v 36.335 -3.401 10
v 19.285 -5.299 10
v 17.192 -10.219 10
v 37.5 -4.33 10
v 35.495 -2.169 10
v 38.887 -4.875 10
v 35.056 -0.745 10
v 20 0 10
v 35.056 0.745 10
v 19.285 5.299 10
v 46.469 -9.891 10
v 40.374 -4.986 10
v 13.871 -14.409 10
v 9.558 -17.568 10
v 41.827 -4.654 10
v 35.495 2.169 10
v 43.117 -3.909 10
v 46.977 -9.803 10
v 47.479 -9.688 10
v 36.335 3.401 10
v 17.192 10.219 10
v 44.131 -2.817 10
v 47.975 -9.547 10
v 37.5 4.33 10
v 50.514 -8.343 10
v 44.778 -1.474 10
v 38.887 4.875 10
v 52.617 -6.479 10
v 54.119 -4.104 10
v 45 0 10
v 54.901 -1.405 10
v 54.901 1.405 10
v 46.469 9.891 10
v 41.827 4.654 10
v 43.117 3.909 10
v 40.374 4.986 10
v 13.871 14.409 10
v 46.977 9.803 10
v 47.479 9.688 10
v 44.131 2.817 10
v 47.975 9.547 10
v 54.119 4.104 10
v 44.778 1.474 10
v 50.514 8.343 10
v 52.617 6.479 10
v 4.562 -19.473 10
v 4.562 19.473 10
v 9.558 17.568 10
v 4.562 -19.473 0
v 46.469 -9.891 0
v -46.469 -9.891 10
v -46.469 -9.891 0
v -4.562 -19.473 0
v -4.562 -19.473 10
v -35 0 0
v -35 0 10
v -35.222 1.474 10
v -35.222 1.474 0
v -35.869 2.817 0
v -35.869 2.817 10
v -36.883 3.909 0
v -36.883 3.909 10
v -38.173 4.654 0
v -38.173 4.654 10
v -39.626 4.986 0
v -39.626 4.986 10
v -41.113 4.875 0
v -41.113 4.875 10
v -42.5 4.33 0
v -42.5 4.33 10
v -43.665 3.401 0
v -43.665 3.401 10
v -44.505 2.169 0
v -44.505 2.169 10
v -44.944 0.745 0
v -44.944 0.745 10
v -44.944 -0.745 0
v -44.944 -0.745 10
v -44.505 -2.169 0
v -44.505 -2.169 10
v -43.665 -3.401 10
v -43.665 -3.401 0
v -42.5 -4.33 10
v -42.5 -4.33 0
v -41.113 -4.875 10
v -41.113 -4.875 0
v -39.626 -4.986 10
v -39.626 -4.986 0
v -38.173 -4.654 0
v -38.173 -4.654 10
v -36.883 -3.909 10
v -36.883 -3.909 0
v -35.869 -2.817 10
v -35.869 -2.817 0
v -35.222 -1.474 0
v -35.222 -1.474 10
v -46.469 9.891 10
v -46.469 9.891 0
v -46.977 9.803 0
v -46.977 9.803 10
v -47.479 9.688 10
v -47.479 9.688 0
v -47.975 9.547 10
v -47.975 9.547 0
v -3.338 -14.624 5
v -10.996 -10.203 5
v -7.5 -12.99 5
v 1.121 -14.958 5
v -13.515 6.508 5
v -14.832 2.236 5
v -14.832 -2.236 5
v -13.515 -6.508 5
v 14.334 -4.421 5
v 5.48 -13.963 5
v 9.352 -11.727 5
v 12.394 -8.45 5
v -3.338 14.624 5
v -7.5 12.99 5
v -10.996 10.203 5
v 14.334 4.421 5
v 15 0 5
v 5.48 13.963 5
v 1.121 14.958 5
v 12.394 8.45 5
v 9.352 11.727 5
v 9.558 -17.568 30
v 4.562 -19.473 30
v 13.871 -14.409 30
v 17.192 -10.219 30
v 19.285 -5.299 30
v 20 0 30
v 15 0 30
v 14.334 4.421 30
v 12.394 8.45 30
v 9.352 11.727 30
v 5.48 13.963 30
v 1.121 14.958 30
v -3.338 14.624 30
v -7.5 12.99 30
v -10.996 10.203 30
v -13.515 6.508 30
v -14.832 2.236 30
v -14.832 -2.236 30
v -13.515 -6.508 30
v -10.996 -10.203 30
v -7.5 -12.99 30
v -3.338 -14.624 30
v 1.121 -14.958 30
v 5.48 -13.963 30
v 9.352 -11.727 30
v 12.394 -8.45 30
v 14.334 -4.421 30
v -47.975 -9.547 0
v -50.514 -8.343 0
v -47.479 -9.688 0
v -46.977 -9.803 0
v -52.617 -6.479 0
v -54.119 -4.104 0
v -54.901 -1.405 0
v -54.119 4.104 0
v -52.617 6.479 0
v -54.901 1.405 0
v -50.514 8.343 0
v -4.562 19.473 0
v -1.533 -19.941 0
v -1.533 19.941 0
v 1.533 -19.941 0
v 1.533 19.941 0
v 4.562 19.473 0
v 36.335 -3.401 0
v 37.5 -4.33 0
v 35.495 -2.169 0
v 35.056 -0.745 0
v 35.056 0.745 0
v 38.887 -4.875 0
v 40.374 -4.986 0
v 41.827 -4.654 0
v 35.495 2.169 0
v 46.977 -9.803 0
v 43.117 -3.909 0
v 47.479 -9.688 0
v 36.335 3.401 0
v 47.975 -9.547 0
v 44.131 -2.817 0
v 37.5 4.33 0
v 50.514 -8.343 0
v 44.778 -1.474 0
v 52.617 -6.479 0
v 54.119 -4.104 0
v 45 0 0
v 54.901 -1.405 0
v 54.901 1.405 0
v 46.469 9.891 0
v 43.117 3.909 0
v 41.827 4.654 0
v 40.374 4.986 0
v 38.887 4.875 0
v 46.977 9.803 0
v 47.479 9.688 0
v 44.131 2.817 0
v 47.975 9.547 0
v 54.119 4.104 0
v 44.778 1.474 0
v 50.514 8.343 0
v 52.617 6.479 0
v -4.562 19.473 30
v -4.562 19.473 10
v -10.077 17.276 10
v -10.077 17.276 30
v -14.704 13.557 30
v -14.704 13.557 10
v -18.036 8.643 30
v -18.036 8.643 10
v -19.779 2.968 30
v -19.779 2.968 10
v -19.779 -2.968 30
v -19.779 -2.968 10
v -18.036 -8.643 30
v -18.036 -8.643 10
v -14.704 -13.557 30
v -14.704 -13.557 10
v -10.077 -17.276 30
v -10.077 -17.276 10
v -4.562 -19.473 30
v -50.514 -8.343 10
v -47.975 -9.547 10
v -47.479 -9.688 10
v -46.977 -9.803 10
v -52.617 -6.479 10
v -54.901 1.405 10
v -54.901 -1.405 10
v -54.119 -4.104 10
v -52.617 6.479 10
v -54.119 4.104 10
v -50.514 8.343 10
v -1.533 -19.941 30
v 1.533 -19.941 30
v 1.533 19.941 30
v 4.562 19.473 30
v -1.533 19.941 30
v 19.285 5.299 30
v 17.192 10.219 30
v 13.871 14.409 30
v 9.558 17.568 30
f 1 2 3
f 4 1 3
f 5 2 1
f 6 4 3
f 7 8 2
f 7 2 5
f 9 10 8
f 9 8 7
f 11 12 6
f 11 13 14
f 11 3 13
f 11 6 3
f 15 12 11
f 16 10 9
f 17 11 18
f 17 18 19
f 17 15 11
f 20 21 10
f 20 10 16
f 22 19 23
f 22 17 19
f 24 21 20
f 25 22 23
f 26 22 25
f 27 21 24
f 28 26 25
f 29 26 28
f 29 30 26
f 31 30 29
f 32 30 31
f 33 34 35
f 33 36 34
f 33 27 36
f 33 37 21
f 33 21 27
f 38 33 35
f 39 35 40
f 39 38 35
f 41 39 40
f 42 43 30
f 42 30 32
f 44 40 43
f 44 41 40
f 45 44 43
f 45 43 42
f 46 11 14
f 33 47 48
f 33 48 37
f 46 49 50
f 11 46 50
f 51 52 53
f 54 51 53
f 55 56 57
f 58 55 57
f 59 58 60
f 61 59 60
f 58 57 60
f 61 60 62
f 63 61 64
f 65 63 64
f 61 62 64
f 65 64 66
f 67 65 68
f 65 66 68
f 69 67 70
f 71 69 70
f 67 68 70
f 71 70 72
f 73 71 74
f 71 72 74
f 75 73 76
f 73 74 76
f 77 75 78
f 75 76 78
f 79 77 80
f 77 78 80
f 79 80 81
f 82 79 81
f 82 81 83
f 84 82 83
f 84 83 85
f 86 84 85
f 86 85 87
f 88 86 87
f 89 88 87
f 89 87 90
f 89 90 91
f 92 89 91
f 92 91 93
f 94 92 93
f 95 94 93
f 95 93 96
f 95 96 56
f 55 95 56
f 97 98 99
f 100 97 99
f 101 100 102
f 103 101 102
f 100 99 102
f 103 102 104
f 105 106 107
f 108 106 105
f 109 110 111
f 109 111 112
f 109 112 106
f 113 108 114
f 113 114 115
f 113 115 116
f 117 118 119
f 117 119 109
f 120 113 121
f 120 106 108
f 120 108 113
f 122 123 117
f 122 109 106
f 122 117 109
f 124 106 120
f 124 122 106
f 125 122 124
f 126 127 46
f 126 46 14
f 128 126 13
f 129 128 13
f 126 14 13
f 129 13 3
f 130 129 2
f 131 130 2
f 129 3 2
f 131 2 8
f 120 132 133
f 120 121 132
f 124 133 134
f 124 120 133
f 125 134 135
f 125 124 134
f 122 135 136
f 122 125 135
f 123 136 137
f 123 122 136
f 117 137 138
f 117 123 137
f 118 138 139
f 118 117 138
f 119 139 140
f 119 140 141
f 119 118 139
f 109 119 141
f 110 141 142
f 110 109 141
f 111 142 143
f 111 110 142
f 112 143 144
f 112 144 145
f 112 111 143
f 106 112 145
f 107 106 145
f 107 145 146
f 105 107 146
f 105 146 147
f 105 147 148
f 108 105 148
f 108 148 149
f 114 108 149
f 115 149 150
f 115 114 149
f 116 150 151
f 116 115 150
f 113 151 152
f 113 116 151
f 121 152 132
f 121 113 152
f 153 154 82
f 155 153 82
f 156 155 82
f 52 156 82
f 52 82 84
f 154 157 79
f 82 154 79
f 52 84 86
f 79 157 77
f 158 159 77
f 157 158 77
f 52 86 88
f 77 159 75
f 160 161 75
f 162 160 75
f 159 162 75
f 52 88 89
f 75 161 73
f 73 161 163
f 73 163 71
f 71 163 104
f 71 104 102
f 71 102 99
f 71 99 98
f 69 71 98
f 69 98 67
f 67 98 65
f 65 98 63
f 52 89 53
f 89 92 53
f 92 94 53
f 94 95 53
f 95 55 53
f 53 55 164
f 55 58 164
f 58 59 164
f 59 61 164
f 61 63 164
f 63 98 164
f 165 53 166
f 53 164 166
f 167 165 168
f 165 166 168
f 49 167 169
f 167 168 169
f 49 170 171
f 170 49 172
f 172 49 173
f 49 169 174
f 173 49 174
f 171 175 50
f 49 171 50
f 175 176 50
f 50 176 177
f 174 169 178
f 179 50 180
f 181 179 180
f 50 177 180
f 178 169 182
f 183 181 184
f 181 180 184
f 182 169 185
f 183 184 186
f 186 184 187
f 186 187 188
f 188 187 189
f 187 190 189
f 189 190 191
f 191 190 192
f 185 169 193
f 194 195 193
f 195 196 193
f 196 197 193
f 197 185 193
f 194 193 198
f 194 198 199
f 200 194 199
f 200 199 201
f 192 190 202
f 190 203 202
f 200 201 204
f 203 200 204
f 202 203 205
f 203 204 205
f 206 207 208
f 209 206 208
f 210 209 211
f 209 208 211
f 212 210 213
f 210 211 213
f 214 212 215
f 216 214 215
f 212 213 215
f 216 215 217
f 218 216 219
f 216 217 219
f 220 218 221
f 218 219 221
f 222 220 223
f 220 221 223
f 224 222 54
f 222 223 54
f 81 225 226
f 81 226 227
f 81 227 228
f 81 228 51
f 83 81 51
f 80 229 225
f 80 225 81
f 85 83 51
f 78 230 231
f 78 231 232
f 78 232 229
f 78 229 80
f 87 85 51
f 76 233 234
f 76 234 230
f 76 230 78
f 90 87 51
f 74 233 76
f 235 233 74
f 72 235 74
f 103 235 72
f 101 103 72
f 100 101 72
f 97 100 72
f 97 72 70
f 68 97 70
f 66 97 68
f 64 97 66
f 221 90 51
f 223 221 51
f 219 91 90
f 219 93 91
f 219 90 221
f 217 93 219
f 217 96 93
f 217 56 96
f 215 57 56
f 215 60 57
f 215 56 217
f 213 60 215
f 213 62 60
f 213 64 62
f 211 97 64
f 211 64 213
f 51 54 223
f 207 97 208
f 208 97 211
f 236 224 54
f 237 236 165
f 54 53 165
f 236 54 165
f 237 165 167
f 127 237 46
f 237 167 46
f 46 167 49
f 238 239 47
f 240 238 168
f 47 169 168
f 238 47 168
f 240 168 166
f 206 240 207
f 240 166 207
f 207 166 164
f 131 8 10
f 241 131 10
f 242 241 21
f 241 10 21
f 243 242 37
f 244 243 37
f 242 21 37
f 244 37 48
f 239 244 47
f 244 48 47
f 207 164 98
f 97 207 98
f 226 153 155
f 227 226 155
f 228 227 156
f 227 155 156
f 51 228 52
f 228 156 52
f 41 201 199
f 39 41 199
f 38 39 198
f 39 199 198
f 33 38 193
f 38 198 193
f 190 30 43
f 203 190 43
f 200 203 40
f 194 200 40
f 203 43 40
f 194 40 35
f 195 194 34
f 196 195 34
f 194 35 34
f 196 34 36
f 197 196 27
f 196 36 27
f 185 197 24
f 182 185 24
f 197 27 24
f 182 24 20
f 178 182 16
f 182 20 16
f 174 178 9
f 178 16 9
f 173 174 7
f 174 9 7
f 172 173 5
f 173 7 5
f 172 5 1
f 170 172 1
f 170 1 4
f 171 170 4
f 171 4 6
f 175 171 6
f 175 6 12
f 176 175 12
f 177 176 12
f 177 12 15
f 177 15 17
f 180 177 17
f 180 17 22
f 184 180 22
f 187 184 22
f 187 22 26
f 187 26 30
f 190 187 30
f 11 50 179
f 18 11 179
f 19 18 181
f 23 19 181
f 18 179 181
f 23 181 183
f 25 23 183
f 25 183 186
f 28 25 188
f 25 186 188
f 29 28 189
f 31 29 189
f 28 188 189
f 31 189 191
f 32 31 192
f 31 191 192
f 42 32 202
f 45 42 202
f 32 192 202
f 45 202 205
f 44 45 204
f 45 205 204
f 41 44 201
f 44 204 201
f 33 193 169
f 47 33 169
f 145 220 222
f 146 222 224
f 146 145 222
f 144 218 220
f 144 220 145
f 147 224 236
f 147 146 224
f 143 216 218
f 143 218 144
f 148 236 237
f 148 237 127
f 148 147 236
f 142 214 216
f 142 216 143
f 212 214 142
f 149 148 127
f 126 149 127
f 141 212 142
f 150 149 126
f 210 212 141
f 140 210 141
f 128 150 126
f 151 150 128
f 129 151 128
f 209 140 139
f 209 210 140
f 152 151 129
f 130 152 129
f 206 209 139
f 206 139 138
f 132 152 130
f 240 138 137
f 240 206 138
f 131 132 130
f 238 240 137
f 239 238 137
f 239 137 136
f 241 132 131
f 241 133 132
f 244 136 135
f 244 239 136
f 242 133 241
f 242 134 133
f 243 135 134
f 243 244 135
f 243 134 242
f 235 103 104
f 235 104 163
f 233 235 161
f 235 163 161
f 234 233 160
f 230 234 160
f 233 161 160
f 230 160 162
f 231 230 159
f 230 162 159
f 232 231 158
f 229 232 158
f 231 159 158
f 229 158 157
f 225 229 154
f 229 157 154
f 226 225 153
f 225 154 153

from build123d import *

# Parameters (mm, degrees)
F1_DEPTH  = 10
F2_R      = 5
F3_DEPTH  = 10.001
F2_R_2    = 15
F4_DEPTH  = 20
F4_FACE_R = 15
F5_DEPTH  = 5


with BuildPart() as f1:
    # F0 (on Top) → F1 (new body)
    with BuildSketch(Plane.XY):
        with BuildLine():
            Line((47.974863, -9.547261), (46.469416, -9.891452))
            ThreePointArc((46.469416, -9.891452), (47.228793, -9.74846), (47.974863, -9.547261))
        make_face()
        with BuildLine():
            Line((4.561589, -19.472851), (46.469416, -9.891452))
            Line((46.469416, -9.891452), (47.974863, -9.547261))
            ThreePointArc((47.974863, -9.547261), (55, 0), (47.974863, 9.547261))
            Line((47.974863, 9.547261), (46.469416, 9.891452))
            Line((46.469416, 9.891452), (4.561589, 19.472851))
            ThreePointArc((4.561589, 19.472851), (0, 20), (-4.561589, 19.472851))
            Line((-4.561589, 19.472851), (-46.469416, 9.891452))
            Line((-46.469416, 9.891452), (-47.974863, 9.547261))
            ThreePointArc((-47.974863, 9.547261), (-55, 0), (-47.974863, -9.547261))
            Line((-47.974863, -9.547261), (-46.469416, -9.891452))
            Line((-46.469416, -9.891452), (-4.561589, -19.472851))
            ThreePointArc((-4.561589, -19.472851), (0, -20), (4.561589, -19.472851))
        make_face()
        with BuildLine():
            Line((46.469416, 9.891452), (47.974863, 9.547261))
            ThreePointArc((47.974863, 9.547261), (47.228793, 9.74846), (46.469416, 9.891452))
        make_face()
        with BuildLine():
            ThreePointArc((-47.974863, -9.547261), (-47.228793, -9.74846), (-46.469416, -9.891452))
            Line((-46.469416, -9.891452), (-47.974863, -9.547261))
        make_face()
        with BuildLine():
            ThreePointArc((-46.469416, 9.891452), (-47.228793, 9.74846), (-47.974863, 9.547261))
            Line((-47.974863, 9.547261), (-46.469416, 9.891452))
        make_face()
    extrude(amount=F1_DEPTH)

    # F2 (on face) → F3 (cut, through all)
    with BuildSketch(Plane.XY.offset(10)):
        with Locations((-40, 0)):
            Circle(F2_R)
        with Locations((40, 0)):
            Circle(F2_R)
    extrude(amount=-F3_DEPTH, mode=Mode.SUBTRACT)

    # F2 (on face) → F4 (join)
    with BuildSketch(Plane.XY.offset(10)):
        with BuildLine():
            ThreePointArc((4.561589, -19.472851), (15.672137, -12.42514), (20, 0))
            ThreePointArc((20, 0), (15.672137, 12.42514), (4.561589, 19.472851))
            ThreePointArc((4.561589, 19.472851), (0, 20), (-4.561589, 19.472851))
            ThreePointArc((-4.561589, 19.472851), (-20, 0), (-4.561589, -19.472851))
            ThreePointArc((-4.561589, -19.472851), (0, -20), (4.561589, -19.472851))
        make_face()
        Circle(F2_R_2, mode=Mode.SUBTRACT)
    extrude(amount=F4_DEPTH)

    # F4_face (on face) → F5 (cut, symmetric)
    with BuildSketch(Plane.XY.offset(10)):
        Circle(F4_FACE_R)
    extrude(amount=F5_DEPTH, both=True, mode=Mode.SUBTRACT)


solid = f1.part
